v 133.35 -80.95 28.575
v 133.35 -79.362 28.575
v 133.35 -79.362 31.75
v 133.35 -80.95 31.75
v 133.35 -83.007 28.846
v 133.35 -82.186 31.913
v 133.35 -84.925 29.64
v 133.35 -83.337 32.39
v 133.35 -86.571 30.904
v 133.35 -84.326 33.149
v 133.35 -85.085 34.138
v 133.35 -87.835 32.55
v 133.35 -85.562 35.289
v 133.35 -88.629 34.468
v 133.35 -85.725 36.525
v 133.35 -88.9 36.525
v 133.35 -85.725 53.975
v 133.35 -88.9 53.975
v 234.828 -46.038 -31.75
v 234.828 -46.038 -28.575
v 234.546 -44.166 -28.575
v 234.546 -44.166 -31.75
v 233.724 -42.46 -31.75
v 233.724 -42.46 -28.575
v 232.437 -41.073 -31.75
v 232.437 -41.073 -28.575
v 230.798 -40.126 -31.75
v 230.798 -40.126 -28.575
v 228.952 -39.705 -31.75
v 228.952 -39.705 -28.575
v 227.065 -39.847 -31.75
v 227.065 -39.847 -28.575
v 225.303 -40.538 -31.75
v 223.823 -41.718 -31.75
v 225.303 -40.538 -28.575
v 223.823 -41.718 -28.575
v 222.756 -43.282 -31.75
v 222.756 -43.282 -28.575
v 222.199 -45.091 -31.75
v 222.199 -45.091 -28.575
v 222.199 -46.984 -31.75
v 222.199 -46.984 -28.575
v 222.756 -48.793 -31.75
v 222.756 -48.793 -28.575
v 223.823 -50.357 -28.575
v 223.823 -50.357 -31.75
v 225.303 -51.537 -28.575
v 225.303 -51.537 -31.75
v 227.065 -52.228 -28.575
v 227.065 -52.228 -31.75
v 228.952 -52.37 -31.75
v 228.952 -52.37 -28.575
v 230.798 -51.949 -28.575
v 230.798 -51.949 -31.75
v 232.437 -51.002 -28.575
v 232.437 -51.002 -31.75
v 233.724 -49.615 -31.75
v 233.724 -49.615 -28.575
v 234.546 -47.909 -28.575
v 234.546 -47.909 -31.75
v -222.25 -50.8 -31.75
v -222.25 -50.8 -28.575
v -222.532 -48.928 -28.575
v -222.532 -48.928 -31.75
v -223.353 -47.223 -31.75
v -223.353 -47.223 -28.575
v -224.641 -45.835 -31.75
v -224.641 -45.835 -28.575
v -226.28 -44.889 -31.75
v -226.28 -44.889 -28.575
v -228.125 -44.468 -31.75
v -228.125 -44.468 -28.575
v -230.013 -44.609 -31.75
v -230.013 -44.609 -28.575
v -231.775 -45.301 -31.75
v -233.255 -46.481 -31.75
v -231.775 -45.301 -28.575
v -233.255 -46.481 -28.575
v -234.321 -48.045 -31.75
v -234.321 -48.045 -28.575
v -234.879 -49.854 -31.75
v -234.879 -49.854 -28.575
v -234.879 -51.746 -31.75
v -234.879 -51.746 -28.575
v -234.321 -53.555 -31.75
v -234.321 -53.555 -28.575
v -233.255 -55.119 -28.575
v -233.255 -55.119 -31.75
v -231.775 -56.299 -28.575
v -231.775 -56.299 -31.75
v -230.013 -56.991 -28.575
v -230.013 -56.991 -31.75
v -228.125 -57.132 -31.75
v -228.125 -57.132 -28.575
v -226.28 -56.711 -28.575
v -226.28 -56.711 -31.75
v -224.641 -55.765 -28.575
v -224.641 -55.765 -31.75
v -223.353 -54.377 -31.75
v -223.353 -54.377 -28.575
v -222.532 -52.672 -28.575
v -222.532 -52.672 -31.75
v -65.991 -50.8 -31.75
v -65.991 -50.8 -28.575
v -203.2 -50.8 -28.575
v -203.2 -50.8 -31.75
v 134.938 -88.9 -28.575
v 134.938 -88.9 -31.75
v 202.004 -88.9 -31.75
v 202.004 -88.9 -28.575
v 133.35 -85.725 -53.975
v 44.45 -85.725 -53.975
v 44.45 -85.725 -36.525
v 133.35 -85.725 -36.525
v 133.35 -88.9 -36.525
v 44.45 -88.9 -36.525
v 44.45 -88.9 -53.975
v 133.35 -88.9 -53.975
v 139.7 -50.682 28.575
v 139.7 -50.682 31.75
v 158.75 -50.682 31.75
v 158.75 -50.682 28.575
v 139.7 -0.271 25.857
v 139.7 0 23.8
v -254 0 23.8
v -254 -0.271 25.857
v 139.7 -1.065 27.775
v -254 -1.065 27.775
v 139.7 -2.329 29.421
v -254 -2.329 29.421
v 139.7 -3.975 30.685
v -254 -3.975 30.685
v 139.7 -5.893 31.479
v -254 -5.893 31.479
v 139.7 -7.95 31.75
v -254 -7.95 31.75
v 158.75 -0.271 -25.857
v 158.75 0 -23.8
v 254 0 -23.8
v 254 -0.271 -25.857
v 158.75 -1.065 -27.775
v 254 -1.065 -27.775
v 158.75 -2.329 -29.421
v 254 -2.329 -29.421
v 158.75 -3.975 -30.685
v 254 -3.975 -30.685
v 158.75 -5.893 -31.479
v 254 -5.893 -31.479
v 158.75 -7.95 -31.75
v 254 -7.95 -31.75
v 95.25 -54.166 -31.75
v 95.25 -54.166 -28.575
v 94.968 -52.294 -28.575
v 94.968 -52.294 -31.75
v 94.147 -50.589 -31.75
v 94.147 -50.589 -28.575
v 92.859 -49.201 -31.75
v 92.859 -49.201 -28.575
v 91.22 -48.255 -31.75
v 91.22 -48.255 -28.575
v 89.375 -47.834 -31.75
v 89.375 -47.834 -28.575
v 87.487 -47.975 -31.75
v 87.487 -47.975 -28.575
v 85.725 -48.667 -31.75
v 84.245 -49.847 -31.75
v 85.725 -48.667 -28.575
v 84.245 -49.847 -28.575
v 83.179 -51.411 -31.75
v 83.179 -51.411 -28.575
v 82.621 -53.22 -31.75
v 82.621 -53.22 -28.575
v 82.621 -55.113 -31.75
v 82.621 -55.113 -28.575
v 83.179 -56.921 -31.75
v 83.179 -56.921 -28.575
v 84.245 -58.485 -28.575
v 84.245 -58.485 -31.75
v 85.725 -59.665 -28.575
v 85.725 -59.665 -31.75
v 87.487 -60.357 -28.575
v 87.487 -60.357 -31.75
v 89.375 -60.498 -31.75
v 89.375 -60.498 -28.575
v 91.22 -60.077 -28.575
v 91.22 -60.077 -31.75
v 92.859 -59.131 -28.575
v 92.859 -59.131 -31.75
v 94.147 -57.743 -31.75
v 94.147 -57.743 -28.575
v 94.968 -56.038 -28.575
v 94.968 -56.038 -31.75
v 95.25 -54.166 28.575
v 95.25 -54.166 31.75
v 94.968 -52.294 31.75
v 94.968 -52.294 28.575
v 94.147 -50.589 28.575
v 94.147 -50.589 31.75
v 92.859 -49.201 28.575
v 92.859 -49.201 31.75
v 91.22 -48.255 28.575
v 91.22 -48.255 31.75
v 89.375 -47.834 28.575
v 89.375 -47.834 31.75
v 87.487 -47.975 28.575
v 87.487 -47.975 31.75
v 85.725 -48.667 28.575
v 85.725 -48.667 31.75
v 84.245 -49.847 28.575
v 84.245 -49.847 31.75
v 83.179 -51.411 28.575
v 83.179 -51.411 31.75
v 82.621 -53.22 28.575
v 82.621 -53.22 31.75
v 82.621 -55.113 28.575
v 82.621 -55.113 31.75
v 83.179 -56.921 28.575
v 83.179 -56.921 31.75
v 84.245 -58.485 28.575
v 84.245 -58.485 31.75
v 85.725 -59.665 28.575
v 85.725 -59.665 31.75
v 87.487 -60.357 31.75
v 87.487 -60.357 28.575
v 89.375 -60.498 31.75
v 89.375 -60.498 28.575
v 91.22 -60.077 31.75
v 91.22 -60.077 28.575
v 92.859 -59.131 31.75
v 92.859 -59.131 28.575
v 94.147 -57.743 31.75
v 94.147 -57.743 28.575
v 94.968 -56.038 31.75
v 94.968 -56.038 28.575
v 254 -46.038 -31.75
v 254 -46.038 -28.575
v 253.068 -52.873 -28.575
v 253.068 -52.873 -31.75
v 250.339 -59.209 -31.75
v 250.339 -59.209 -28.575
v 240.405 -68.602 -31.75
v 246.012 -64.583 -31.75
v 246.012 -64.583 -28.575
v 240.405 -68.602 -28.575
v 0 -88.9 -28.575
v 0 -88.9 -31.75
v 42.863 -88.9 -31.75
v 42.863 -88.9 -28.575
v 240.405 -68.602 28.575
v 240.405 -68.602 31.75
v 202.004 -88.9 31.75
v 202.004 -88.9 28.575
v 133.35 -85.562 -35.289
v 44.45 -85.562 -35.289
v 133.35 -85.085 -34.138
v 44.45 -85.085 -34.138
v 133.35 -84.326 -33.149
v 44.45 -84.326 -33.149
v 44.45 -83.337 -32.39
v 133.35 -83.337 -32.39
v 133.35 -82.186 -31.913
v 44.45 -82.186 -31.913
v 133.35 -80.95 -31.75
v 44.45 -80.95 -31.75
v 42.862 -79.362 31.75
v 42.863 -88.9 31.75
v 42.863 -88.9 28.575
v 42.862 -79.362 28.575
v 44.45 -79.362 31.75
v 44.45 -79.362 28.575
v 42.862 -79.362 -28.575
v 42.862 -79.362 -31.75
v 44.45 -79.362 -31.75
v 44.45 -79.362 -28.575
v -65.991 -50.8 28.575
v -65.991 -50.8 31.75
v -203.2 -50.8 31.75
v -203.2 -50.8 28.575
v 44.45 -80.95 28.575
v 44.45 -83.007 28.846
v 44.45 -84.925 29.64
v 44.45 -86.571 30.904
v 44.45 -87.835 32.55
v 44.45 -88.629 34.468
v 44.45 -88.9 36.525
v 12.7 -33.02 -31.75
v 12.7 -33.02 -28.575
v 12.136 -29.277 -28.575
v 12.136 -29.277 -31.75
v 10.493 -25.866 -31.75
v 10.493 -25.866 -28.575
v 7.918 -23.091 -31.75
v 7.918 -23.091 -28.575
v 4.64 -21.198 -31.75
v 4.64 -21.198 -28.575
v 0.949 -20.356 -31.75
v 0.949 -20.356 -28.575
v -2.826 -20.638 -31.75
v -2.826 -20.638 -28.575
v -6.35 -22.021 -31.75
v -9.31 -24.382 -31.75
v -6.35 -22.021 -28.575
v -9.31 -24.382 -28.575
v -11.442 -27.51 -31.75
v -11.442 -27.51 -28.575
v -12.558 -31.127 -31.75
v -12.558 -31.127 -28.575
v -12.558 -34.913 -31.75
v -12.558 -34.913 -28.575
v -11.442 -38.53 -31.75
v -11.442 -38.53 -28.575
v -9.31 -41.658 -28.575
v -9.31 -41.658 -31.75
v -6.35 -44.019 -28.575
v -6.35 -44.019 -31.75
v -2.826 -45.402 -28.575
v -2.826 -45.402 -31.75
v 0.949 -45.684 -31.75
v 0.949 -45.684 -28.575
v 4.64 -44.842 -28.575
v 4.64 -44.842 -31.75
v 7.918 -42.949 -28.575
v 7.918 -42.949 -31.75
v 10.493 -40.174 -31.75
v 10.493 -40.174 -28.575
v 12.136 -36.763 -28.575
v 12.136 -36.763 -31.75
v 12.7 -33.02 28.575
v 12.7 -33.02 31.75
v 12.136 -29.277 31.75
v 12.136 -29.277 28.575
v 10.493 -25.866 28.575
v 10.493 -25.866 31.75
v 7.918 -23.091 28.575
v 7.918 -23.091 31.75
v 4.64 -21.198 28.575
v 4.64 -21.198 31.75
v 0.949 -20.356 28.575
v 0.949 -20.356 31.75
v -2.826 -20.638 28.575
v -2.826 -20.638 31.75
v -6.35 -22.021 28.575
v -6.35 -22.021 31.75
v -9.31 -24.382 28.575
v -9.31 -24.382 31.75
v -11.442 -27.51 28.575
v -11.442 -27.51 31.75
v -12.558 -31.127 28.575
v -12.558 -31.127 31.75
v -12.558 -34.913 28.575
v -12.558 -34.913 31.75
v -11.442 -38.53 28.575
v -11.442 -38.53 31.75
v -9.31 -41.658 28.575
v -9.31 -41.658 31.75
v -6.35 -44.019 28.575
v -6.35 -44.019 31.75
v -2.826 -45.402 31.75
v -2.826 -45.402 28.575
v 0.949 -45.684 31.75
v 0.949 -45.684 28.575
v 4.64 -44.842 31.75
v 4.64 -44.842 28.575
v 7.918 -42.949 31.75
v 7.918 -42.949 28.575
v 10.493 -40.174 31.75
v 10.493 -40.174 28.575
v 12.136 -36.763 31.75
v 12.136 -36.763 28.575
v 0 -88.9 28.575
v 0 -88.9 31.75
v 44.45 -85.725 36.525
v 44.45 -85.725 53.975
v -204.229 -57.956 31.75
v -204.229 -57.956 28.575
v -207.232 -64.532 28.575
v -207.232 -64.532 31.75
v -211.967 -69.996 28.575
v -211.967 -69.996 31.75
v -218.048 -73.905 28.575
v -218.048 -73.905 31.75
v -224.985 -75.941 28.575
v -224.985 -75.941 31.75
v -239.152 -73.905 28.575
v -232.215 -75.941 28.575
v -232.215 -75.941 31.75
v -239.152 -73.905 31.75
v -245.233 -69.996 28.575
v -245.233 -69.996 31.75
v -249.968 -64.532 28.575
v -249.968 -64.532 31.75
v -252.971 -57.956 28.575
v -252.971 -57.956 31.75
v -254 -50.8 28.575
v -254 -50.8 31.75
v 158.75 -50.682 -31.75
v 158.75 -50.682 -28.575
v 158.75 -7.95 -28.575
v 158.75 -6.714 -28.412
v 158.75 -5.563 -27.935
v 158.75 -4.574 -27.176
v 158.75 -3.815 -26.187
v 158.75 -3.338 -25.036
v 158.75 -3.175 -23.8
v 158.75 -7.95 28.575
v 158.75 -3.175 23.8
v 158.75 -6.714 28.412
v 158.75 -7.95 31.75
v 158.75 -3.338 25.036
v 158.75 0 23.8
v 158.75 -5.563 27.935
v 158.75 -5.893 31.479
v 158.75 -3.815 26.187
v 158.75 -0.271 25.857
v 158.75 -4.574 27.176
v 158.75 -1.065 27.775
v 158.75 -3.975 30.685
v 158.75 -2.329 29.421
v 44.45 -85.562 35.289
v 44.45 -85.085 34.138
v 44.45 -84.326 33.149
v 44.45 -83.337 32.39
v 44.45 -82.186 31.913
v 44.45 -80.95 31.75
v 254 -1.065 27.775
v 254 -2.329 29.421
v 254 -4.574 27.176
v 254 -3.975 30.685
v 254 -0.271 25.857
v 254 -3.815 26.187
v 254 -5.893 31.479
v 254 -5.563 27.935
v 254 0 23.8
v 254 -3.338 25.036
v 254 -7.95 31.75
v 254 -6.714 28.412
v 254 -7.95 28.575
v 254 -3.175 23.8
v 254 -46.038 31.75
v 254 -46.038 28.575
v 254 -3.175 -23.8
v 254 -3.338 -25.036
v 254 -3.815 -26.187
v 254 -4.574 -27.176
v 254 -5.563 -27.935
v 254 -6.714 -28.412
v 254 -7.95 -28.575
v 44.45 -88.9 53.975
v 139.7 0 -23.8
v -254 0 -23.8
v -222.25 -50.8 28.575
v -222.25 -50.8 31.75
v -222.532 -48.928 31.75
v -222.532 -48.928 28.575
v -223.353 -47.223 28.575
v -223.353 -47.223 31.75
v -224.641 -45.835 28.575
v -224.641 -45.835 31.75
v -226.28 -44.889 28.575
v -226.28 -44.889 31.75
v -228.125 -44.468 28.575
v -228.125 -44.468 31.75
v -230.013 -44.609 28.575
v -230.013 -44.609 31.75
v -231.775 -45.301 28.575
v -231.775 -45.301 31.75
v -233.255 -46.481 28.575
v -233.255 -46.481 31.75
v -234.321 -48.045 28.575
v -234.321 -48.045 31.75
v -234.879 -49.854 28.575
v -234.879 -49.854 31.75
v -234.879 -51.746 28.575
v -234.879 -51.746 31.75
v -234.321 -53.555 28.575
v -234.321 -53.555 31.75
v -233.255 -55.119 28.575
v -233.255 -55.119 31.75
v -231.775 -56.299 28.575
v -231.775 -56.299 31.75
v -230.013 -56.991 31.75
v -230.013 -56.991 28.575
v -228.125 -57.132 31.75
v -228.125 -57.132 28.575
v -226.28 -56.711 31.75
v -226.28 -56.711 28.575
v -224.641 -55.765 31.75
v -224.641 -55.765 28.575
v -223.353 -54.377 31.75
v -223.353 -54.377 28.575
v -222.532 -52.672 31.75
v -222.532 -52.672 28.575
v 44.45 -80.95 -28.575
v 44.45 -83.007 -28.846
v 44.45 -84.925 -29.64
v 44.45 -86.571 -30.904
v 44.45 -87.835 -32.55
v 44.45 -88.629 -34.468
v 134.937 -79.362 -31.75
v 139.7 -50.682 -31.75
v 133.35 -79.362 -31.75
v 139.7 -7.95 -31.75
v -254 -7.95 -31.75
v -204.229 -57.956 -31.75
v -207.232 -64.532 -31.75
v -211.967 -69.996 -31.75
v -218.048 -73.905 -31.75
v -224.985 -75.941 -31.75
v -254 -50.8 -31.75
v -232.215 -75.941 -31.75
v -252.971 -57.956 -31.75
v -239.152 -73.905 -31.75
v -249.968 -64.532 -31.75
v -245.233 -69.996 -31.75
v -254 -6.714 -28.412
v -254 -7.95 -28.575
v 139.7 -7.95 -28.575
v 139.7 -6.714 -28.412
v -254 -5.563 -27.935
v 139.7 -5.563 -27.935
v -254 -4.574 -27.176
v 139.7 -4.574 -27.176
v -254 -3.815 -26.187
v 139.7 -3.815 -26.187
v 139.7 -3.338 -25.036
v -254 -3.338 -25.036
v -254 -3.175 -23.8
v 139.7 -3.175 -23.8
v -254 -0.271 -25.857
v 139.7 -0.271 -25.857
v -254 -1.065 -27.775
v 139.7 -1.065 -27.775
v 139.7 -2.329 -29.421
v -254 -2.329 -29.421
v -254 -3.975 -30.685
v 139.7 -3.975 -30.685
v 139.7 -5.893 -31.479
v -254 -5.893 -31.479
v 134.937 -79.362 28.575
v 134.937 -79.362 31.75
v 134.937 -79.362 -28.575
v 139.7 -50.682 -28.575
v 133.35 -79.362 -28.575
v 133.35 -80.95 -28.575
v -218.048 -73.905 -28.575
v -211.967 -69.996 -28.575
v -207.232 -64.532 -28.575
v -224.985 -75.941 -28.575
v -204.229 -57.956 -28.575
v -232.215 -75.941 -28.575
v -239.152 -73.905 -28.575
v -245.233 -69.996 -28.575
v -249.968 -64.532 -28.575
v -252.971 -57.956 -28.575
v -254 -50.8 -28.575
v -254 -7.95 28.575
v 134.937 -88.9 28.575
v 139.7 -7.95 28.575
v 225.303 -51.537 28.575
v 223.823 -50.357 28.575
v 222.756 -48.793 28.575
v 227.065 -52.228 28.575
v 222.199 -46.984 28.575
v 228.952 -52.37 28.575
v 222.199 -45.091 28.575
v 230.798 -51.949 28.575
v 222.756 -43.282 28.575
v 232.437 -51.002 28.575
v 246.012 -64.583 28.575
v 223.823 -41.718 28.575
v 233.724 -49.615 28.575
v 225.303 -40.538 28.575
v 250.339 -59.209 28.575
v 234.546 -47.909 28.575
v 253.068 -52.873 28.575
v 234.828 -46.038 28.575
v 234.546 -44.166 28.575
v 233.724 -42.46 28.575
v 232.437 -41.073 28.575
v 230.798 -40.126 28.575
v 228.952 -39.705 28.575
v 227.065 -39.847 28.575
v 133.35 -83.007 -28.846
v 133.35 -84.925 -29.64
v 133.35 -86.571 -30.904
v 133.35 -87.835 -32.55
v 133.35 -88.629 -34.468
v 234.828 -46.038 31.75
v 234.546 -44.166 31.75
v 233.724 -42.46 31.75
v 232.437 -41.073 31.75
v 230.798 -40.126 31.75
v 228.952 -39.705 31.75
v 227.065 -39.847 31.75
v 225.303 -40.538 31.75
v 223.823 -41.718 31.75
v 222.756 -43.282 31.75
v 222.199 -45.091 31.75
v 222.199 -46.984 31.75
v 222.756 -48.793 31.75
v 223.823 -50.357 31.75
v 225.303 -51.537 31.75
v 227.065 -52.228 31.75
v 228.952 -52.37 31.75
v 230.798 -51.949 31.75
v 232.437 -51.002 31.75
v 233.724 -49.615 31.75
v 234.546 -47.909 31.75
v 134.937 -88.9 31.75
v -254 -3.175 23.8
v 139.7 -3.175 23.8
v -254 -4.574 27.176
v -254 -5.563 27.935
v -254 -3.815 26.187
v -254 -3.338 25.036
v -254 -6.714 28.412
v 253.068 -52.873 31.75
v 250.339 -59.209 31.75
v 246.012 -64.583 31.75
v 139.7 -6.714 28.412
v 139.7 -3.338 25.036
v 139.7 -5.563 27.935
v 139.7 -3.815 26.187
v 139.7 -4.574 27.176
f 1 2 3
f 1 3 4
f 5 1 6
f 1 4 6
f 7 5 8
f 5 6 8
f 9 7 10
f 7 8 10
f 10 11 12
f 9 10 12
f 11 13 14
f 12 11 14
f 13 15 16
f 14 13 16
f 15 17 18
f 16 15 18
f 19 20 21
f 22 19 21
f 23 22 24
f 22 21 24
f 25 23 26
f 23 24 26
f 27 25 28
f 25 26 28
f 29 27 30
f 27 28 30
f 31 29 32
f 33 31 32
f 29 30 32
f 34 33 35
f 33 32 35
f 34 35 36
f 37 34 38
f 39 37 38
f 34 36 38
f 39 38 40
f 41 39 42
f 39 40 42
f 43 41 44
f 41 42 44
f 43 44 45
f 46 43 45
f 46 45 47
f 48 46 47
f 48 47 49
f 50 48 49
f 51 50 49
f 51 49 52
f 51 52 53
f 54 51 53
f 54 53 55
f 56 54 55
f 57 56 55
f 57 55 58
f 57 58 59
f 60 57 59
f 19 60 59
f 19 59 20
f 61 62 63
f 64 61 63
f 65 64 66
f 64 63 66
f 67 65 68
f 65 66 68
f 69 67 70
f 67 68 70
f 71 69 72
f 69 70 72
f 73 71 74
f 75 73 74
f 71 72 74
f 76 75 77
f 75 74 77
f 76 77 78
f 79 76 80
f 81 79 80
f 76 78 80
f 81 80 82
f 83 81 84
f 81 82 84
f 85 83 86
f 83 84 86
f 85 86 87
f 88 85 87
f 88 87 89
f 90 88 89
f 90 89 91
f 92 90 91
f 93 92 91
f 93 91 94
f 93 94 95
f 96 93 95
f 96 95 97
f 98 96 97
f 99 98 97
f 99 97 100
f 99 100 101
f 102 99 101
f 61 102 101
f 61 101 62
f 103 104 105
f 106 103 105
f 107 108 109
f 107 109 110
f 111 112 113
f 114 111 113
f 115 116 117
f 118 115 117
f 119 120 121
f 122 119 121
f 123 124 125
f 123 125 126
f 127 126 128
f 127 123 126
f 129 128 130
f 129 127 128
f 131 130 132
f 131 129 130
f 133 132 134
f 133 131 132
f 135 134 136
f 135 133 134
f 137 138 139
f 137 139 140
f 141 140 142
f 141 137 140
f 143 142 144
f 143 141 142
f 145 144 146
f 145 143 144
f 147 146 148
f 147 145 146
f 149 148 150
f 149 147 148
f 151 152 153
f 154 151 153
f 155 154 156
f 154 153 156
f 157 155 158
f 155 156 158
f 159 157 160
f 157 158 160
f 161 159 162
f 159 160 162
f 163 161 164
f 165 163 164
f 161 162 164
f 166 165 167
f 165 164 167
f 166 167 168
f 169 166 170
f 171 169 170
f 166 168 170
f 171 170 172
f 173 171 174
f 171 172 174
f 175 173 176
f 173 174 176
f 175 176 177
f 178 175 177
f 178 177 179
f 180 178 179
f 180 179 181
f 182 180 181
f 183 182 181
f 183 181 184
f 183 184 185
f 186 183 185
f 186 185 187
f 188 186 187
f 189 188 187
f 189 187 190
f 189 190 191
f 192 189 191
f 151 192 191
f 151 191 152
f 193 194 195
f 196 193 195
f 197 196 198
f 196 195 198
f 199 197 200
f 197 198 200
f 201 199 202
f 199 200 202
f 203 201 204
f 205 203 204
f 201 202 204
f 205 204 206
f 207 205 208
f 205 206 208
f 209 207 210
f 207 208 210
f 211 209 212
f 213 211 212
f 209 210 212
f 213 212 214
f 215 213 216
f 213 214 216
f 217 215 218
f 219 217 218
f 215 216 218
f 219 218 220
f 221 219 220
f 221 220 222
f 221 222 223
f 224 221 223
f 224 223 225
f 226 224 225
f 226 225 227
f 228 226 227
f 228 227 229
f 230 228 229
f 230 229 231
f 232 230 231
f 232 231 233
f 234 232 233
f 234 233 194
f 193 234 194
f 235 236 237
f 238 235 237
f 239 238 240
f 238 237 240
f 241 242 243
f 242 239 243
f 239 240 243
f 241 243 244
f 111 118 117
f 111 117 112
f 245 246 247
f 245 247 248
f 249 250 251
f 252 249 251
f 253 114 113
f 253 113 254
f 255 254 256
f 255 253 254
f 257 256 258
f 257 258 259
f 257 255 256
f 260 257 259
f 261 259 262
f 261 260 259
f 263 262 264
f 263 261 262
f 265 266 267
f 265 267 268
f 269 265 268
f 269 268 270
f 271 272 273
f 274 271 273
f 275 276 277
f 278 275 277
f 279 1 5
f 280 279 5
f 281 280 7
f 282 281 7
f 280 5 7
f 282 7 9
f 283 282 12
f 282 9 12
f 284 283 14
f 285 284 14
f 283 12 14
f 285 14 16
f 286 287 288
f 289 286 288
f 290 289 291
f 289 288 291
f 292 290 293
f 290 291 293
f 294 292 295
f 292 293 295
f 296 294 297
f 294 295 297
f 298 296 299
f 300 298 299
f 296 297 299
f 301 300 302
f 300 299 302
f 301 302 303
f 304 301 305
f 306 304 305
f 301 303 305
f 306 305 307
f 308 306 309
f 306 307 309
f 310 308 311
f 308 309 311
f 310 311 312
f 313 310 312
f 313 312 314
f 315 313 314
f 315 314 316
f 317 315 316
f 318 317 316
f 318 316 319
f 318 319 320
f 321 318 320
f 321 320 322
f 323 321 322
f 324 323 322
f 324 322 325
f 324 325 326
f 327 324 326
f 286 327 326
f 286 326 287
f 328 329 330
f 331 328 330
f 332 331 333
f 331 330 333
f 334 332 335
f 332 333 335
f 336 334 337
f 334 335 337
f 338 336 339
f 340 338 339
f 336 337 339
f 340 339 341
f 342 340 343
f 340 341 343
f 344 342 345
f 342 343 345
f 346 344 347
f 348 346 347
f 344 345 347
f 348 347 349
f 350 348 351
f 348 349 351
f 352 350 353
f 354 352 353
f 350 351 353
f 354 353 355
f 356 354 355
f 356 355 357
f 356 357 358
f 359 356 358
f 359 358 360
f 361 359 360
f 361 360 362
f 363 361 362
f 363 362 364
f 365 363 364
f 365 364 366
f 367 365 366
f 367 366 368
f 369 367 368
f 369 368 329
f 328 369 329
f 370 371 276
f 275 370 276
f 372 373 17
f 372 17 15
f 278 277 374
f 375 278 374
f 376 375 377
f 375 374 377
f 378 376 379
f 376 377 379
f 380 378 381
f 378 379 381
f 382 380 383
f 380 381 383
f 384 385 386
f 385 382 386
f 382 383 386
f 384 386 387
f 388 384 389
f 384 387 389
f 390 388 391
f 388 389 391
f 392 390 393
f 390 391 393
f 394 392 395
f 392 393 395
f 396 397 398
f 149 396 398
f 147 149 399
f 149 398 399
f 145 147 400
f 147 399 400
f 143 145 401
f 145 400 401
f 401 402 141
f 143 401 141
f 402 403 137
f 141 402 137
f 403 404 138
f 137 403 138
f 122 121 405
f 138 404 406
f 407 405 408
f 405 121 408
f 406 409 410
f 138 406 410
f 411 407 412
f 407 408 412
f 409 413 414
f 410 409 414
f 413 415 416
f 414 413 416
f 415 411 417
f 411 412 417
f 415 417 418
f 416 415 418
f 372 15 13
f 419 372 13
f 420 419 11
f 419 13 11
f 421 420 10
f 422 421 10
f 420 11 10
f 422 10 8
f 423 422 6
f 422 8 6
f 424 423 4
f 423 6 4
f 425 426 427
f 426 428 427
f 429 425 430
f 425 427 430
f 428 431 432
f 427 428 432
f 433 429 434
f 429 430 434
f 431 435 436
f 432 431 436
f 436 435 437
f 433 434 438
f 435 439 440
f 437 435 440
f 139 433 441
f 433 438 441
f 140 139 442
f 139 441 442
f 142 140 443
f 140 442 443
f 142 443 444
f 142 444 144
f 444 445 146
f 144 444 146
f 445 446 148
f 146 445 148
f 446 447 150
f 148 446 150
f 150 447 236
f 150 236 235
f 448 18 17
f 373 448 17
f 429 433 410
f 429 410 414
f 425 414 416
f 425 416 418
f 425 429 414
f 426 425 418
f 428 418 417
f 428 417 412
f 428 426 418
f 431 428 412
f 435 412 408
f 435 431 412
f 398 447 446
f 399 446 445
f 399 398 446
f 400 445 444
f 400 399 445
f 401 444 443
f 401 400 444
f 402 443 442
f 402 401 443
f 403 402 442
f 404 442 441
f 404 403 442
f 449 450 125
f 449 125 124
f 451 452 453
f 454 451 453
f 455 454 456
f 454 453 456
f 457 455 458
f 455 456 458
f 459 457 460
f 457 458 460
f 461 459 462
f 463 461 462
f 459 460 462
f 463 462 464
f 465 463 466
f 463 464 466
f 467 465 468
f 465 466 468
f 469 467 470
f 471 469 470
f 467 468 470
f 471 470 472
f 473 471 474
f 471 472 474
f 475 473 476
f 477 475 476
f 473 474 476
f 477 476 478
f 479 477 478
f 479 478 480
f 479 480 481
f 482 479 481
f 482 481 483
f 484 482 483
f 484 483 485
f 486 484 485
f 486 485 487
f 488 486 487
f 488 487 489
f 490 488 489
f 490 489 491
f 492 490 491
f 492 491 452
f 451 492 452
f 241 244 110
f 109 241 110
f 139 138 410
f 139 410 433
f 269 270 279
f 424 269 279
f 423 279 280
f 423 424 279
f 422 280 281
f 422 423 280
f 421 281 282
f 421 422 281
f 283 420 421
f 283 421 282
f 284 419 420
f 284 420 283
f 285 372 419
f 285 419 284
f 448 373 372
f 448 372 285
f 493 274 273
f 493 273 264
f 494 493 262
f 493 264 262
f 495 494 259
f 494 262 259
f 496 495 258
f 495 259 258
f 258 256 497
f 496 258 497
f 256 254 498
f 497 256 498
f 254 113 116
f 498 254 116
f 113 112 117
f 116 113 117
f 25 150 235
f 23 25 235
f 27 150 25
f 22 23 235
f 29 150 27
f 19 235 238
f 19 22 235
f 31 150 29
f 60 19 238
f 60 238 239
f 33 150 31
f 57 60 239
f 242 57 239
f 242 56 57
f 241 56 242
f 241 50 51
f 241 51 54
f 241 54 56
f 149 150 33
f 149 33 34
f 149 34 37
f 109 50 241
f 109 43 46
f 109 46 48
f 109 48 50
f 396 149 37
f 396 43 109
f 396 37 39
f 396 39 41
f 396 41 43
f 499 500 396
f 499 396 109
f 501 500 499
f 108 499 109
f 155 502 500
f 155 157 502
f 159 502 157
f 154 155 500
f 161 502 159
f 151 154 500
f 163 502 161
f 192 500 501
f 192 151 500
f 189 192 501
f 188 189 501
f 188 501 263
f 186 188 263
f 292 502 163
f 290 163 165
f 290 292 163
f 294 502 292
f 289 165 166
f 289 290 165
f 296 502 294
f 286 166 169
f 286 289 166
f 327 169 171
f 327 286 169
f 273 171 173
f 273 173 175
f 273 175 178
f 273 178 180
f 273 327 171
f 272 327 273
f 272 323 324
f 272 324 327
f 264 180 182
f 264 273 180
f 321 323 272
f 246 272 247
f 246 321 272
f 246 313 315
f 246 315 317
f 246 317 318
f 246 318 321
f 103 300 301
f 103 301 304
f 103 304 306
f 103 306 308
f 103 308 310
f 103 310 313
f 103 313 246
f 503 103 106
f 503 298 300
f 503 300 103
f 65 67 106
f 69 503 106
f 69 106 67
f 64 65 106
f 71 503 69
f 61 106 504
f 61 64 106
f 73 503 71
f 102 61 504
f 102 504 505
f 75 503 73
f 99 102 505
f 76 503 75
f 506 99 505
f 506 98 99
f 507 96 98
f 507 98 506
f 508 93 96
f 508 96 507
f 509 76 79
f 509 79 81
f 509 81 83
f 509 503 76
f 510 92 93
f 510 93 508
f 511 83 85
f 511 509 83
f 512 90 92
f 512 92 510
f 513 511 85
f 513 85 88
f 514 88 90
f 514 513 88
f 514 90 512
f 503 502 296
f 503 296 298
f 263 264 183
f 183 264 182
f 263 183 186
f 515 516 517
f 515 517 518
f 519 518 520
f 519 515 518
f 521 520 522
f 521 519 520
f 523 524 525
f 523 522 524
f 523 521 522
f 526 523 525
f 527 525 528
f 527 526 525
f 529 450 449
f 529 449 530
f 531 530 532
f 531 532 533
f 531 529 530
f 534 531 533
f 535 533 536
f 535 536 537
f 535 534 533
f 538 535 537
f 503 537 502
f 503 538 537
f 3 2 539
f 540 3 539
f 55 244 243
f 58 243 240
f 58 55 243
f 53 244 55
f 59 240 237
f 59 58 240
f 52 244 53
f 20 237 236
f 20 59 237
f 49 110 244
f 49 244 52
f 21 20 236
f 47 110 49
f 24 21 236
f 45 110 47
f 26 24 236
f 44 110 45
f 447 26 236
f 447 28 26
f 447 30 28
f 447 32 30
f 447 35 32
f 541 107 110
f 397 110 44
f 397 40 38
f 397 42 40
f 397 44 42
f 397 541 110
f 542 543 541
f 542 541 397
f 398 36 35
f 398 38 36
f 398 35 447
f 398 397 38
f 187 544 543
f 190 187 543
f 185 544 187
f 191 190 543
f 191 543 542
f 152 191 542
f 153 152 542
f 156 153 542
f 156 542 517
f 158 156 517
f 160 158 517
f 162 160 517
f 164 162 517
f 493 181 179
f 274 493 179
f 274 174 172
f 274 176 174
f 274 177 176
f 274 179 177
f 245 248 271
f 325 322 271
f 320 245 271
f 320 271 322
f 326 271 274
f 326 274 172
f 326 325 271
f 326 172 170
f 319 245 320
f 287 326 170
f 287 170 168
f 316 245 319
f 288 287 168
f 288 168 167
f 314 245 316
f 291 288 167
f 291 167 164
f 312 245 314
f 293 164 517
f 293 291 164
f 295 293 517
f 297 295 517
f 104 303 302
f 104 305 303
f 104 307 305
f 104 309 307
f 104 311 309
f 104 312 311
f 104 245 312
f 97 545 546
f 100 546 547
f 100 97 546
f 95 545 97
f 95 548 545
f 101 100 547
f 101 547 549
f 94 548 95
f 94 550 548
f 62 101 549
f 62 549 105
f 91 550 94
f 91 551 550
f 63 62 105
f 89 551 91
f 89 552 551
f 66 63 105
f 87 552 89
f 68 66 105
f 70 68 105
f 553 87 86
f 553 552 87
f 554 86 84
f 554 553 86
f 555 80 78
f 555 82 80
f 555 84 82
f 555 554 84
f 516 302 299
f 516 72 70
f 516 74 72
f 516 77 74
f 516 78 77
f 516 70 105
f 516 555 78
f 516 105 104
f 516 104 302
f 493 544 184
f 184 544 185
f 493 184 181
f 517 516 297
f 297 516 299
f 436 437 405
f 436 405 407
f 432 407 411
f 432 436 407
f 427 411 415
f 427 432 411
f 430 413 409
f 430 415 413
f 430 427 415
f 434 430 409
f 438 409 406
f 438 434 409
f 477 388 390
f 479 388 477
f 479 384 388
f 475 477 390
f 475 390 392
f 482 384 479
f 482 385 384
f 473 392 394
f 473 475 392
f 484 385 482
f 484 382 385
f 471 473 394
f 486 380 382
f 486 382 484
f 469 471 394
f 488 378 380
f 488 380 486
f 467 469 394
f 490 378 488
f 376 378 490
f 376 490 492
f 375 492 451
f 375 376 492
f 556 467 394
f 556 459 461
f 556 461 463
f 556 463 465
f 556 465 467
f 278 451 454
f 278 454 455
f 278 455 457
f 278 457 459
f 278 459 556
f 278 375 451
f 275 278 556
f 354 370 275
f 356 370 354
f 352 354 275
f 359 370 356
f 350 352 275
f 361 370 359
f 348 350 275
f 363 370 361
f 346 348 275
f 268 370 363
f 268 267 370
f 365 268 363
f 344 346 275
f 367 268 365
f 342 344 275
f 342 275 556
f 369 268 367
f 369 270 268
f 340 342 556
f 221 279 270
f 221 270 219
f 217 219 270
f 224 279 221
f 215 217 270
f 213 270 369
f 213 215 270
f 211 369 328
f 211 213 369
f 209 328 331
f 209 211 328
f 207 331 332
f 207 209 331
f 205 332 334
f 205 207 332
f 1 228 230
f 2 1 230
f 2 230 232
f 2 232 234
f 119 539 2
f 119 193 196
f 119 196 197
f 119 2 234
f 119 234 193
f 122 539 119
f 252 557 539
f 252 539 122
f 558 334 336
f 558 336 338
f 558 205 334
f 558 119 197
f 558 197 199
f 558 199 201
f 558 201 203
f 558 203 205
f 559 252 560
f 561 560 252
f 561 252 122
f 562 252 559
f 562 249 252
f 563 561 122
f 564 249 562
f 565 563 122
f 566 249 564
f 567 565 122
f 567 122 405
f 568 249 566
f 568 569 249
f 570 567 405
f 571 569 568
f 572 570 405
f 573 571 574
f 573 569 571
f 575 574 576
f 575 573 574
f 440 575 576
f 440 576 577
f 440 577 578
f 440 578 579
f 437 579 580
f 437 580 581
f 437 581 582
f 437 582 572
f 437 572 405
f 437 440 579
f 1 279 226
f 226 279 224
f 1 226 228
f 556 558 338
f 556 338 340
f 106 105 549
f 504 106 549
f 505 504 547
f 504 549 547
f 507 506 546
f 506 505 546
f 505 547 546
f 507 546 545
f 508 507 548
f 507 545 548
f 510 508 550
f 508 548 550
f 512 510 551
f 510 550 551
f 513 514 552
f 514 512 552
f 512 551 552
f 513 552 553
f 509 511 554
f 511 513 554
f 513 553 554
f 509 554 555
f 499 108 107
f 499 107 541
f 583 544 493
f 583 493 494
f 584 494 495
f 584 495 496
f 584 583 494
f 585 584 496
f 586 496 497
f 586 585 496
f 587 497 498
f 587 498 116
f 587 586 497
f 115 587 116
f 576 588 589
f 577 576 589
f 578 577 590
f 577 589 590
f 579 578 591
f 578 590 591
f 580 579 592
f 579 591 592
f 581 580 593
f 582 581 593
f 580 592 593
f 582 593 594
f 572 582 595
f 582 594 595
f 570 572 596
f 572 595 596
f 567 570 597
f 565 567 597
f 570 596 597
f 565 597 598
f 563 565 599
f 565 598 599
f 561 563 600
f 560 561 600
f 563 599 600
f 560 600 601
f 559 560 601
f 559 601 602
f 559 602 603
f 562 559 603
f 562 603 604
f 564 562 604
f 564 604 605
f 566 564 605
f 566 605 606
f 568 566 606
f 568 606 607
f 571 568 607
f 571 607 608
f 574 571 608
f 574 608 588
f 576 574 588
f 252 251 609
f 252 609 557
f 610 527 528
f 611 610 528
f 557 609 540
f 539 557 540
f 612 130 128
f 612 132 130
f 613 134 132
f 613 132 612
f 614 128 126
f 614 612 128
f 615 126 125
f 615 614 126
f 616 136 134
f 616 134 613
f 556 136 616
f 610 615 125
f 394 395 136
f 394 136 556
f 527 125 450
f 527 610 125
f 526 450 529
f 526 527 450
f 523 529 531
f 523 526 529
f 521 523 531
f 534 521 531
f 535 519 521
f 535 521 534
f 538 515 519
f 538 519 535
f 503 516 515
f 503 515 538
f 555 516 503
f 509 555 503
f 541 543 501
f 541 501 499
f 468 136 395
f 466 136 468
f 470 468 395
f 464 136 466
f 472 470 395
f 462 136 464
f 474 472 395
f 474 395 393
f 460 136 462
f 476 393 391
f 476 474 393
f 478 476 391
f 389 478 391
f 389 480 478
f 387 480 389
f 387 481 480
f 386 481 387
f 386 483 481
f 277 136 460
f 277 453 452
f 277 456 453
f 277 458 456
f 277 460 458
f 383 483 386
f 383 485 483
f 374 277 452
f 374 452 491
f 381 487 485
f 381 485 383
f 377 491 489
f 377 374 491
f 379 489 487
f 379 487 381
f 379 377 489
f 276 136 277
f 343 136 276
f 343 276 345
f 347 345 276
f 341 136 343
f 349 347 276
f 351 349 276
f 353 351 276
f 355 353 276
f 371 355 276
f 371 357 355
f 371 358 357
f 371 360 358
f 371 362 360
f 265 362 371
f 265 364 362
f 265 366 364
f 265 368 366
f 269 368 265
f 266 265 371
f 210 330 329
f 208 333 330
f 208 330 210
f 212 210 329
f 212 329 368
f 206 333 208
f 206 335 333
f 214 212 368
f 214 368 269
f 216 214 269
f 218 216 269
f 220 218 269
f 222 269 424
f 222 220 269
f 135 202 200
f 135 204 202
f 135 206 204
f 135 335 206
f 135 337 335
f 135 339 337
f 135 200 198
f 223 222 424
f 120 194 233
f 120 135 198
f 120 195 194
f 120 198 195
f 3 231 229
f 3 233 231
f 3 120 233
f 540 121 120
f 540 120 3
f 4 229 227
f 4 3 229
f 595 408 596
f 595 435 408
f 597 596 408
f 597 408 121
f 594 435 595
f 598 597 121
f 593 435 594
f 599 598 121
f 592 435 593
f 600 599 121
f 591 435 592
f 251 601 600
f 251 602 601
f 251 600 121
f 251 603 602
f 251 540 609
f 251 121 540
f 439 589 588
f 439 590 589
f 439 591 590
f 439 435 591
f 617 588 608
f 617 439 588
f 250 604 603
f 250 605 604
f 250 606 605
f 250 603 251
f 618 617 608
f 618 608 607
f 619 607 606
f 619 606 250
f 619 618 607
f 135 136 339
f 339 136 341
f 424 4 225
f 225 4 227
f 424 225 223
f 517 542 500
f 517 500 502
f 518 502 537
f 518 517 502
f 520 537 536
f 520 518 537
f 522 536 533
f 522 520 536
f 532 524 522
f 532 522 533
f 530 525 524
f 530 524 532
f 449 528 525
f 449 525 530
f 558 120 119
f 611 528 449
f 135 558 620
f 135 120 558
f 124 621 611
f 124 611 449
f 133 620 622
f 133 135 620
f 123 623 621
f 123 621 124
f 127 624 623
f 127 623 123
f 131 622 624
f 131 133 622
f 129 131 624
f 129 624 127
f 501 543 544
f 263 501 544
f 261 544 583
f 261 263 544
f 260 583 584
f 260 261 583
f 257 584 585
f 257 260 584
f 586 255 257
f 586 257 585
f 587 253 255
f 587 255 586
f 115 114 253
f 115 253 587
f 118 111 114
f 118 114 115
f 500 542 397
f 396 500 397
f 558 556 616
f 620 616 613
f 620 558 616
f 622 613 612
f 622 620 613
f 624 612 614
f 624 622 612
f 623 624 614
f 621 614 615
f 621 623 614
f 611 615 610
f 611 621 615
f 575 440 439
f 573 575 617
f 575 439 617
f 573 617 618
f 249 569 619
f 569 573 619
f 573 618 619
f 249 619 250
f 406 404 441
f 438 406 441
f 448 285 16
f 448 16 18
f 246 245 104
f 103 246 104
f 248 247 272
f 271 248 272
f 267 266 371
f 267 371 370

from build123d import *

# Parameters (mm, degrees)
SKETCH1_W                      = 508
SKETCH1_H                      = 63.5
BASE_FLANGE1_DEPTH             = 3.175
EDGE_FLANGE1_STRIP_W           = 22.2504
EDGE_FLANGE1_STRIP_H           = 3.175
EDGE_FLANGE1_STRIP_CUT_DEPTH   = 508
EDGE_FLANGE1_STRIP_2_W         = 22.2504
EDGE_FLANGE1_STRIP_2_H         = 3.175
EDGE_FLANGE1_STRIP_CUT_2_DEPTH = 508
EDGE_FLANGE1_DEPTH             = 508
EDGE_FLANGE1_BEND_DEPTH        = 508
SKETCH12_R                     = 12.7
CUT_EXTRUDE1_DEPTH             = 277.498571425
SKETCH13_R                     = 6.35
CUT_EXTRUDE2_DEPTH             = 277.498571425
CUT_EXTRUDE4_DEPTH             = 277.498571425
SKETCH16_R                     = 6.35
CUT_EXTRUDE5_DEPTH             = 277.498571425
CUT_EXTRUDE6_DEPTH             = 277.498571425
SKETCH18_R                     = 6.35
CUT_EXTRUDE8_DEPTH             = 277.498571425
SKETCH22_W                     = 19.05
SKETCH22_H                     = 50.682224045
CUT_EXTRUDE9_DEPTH             = 277.498571425
EDGE_FLANGE2_STRIP_W           = 22.2504
EDGE_FLANGE2_STRIP_H           = 3.175
EDGE_FLANGE2_STRIP_CUT_DEPTH   = 88.9
EDGE_FLANGE2_RELIEF_W          = 23.8379
EDGE_FLANGE2_RELIEF_H          = 1.5875
EDGE_FLANGE2_RELIEF_CUT_DEPTH  = 3.175
EDGE_FLANGE2_DEPTH             = 88.9


# Sheet-metal steps are written as plain solids
with BuildPart() as part:
    # Sketch1 → Base-Flange1 (new body)
    with BuildSketch(Plane(origin=(0, 0, 0), x_dir=(1, 0, 0), z_dir=(0, 1, 0))):
        Rectangle(SKETCH1_W, SKETCH1_H)
    extrude(amount=-BASE_FLANGE1_DEPTH)

    # Edge-Flange1 strip (across the edge) → Edge-Flange1 strip cut (cut)
    with BuildSketch(Plane(origin=(254, -3.175, 31.75), x_dir=(0, 0, -1), z_dir=(-1, 0, 0))):
        with Locations((-3.175, -1.5875)):
            Rectangle(EDGE_FLANGE1_STRIP_W, EDGE_FLANGE1_STRIP_H)
    extrude(amount=EDGE_FLANGE1_STRIP_CUT_DEPTH, mode=Mode.SUBTRACT)

    # Edge-Flange1 strip 2 (across the edge) → Edge-Flange1 strip cut 2 (cut)
    with BuildSketch(Plane(origin=(-254, -3.175, -31.75), x_dir=(0, 0, 1), z_dir=(1, 0, 0))):
        with Locations((-3.175, -1.5875)):
            Rectangle(EDGE_FLANGE1_STRIP_2_W, EDGE_FLANGE1_STRIP_2_H)
    extrude(amount=EDGE_FLANGE1_STRIP_CUT_2_DEPTH, mode=Mode.SUBTRACT)

    # Edge-Flange1 section (across the edge) → Edge-Flange1 (add)
    with BuildSketch(Plane(origin=(254, -3.175, 31.75), x_dir=(0, 0, -1), z_dir=(-1, 0, 0))):
        with BuildLine():
            Line((0, 4.7752), (0, 85.725))
            Line((0, 85.725), (3.175, 85.725))
            Line((3.175, 85.725), (3.175, 4.7752))
            ThreePointArc((3.175, 4.7752), (4.573623698, 1.398623698), (7.9502, 0))
            Line((7.9502, 0), (7.9502, -3.175))
            ThreePointArc((7.9502, -3.175), (2.328559668, -0.846440332), (0, 4.7752))
        make_face()
    extrude(amount=EDGE_FLANGE1_DEPTH)

    # Edge-Flange1 section 2 (across the edge) → Edge-Flange1 bend (add)
    with BuildSketch(Plane(origin=(-254, -3.175, -31.75), x_dir=(0, 0, 1), z_dir=(1, 0, 0))):
        with BuildLine():
            Line((0, 4.7752), (0, 85.725))
            Line((0, 85.725), (3.175, 85.725))
            Line((3.175, 85.725), (3.175, 4.7752))
            ThreePointArc((3.175, 4.7752), (4.573623698, 1.398623698), (7.9502, 0))
            Line((7.9502, 0), (7.9502, -3.175))
            ThreePointArc((7.9502, -3.175), (2.328559668, -0.846440332), (0, 4.7752))
        make_face()
    extrude(amount=EDGE_FLANGE1_BEND_DEPTH)

    # Sketch12 → Cut-Extrude1 (cut, through all)
    with BuildSketch(Plane.XY.offset(31.75)):
        with Locations((0, -33.02)):
            Circle(SKETCH12_R)
    extrude(amount=-CUT_EXTRUDE1_DEPTH, mode=Mode.SUBTRACT)

    # Sketch13 → Cut-Extrude2 (cut, through all)
    with BuildSketch(Plane.XY.offset(31.75)):
        with Locations((88.9, -54.166128078)):
            Circle(SKETCH13_R)
    extrude(amount=-CUT_EXTRUDE2_DEPTH, mode=Mode.SUBTRACT)

    # Sketch14 → Cut-Extrude4 (cut, through all)
    with BuildSketch(Plane.XY.offset(31.75)):
        with BuildLine():
            Line((-65.991135768, -50.8), (-203.2, -50.8))
            ThreePointArc((-203.2, -50.8), (-228.6, -76.2), (-254, -50.8))
            Line((-254, -50.8), (-254, -88.9))
            Line((-254, -88.9), (0, -88.9))
            Line((0, -88.9), (-65.991135768, -50.8))
        make_face()
    extrude(amount=-CUT_EXTRUDE4_DEPTH, mode=Mode.SUBTRACT)

    # Sketch16 → Cut-Extrude5 (cut, through all)
    with BuildSketch(Plane.XY.offset(31.75)):
        with Locations((-228.6, -50.8)):
            Circle(SKETCH16_R)
    extrude(amount=-CUT_EXTRUDE5_DEPTH, mode=Mode.SUBTRACT)

    # Sketch17 → Cut-Extrude6 (cut, through all)
    with BuildSketch(Plane.XY.offset(31.75)):
        with BuildLine():
            ThreePointArc((254, -46.0375), (250.338556711, -59.209109907), (240.404769023, -68.601518366))
            Line((240.404769023, -68.601518366), (202.003688132, -88.9))
            Line((202.003688132, -88.9), (254, -88.9))
            Line((254, -88.9), (254, -46.0375))
        make_face()
    extrude(amount=-CUT_EXTRUDE6_DEPTH, mode=Mode.SUBTRACT)

    # Sketch18 → Cut-Extrude8 (cut, through all)
    with BuildSketch(Plane.XY.offset(31.75)):
        with Locations((228.477622657, -46.0375)):
            Circle(SKETCH18_R)
    extrude(amount=-CUT_EXTRUDE8_DEPTH, mode=Mode.SUBTRACT)

    # Sketch22 → Cut-Extrude9 (cut, through all)
    with BuildSketch(Plane.XY.offset(31.75)):
        with Locations((149.225, -25.341112023)):
            Rectangle(SKETCH22_W, SKETCH22_H)
    extrude(amount=-CUT_EXTRUDE9_DEPTH, mode=Mode.SUBTRACT)

    # Edge-Flange2 strip (across the edge) → Edge-Flange2 strip cut (cut)
    with BuildSketch(Plane(origin=(133.35, -88.9, -31.75), x_dir=(0, 1, 0), z_dir=(-1, 0, 0))):
        with Locations((-3.175, -1.5875)):
            Rectangle(EDGE_FLANGE2_STRIP_W, EDGE_FLANGE2_STRIP_H)
    edge_flange2_strip_cut = extrude(amount=EDGE_FLANGE2_STRIP_CUT_DEPTH, mode=Mode.SUBTRACT)

    # Edge-Flange2 relief (on the sheet) → Edge-Flange2 relief cut (cut)
    with BuildSketch(Plane(origin=(133.35, -80.9498, -31.75), x_dir=(0, 1, 0), z_dir=(0, 0, -1))):
        with Locations((-10.33145, 0.79375)):
            Rectangle(EDGE_FLANGE2_RELIEF_W, EDGE_FLANGE2_RELIEF_H)
        with Locations((-10.33145, -89.69375)):
            Rectangle(EDGE_FLANGE2_RELIEF_W, EDGE_FLANGE2_RELIEF_H)
    edge_flange2_relief_cut = extrude(amount=-EDGE_FLANGE2_RELIEF_CUT_DEPTH, mode=Mode.SUBTRACT)

    # Edge-Flange2 section (across the edge) → Edge-Flange2 (add)
    with BuildSketch(Plane(origin=(133.35, -88.9, -31.75), x_dir=(0, 1, 0), z_dir=(-1, 0, 0))):
        with BuildLine():
            Line((0, 4.7752), (0, 22.225))
            Line((0, 22.225), (3.175, 22.225))
            Line((3.175, 22.225), (3.175, 4.7752))
            ThreePointArc((3.175, 4.7752), (4.573623698, 1.398623698), (7.9502, 0))
            Line((7.9502, 0), (7.9502, -3.175))
            ThreePointArc((7.9502, -3.175), (2.328559668, -0.846440332), (0, 4.7752))
        make_face()
    edge_flange2 = extrude(amount=EDGE_FLANGE2_DEPTH)

    # Mirror1: Edge-Flange2 strip cut, Edge-Flange2 relief cut, Edge-Flange2 across plane
    add(edge_flange2_strip_cut.mirror(Plane.XY), mode=Mode.SUBTRACT)
    add(edge_flange2_relief_cut.mirror(Plane.XY), mode=Mode.SUBTRACT)
    add(edge_flange2.mirror(Plane.XY))


solid = part.part
